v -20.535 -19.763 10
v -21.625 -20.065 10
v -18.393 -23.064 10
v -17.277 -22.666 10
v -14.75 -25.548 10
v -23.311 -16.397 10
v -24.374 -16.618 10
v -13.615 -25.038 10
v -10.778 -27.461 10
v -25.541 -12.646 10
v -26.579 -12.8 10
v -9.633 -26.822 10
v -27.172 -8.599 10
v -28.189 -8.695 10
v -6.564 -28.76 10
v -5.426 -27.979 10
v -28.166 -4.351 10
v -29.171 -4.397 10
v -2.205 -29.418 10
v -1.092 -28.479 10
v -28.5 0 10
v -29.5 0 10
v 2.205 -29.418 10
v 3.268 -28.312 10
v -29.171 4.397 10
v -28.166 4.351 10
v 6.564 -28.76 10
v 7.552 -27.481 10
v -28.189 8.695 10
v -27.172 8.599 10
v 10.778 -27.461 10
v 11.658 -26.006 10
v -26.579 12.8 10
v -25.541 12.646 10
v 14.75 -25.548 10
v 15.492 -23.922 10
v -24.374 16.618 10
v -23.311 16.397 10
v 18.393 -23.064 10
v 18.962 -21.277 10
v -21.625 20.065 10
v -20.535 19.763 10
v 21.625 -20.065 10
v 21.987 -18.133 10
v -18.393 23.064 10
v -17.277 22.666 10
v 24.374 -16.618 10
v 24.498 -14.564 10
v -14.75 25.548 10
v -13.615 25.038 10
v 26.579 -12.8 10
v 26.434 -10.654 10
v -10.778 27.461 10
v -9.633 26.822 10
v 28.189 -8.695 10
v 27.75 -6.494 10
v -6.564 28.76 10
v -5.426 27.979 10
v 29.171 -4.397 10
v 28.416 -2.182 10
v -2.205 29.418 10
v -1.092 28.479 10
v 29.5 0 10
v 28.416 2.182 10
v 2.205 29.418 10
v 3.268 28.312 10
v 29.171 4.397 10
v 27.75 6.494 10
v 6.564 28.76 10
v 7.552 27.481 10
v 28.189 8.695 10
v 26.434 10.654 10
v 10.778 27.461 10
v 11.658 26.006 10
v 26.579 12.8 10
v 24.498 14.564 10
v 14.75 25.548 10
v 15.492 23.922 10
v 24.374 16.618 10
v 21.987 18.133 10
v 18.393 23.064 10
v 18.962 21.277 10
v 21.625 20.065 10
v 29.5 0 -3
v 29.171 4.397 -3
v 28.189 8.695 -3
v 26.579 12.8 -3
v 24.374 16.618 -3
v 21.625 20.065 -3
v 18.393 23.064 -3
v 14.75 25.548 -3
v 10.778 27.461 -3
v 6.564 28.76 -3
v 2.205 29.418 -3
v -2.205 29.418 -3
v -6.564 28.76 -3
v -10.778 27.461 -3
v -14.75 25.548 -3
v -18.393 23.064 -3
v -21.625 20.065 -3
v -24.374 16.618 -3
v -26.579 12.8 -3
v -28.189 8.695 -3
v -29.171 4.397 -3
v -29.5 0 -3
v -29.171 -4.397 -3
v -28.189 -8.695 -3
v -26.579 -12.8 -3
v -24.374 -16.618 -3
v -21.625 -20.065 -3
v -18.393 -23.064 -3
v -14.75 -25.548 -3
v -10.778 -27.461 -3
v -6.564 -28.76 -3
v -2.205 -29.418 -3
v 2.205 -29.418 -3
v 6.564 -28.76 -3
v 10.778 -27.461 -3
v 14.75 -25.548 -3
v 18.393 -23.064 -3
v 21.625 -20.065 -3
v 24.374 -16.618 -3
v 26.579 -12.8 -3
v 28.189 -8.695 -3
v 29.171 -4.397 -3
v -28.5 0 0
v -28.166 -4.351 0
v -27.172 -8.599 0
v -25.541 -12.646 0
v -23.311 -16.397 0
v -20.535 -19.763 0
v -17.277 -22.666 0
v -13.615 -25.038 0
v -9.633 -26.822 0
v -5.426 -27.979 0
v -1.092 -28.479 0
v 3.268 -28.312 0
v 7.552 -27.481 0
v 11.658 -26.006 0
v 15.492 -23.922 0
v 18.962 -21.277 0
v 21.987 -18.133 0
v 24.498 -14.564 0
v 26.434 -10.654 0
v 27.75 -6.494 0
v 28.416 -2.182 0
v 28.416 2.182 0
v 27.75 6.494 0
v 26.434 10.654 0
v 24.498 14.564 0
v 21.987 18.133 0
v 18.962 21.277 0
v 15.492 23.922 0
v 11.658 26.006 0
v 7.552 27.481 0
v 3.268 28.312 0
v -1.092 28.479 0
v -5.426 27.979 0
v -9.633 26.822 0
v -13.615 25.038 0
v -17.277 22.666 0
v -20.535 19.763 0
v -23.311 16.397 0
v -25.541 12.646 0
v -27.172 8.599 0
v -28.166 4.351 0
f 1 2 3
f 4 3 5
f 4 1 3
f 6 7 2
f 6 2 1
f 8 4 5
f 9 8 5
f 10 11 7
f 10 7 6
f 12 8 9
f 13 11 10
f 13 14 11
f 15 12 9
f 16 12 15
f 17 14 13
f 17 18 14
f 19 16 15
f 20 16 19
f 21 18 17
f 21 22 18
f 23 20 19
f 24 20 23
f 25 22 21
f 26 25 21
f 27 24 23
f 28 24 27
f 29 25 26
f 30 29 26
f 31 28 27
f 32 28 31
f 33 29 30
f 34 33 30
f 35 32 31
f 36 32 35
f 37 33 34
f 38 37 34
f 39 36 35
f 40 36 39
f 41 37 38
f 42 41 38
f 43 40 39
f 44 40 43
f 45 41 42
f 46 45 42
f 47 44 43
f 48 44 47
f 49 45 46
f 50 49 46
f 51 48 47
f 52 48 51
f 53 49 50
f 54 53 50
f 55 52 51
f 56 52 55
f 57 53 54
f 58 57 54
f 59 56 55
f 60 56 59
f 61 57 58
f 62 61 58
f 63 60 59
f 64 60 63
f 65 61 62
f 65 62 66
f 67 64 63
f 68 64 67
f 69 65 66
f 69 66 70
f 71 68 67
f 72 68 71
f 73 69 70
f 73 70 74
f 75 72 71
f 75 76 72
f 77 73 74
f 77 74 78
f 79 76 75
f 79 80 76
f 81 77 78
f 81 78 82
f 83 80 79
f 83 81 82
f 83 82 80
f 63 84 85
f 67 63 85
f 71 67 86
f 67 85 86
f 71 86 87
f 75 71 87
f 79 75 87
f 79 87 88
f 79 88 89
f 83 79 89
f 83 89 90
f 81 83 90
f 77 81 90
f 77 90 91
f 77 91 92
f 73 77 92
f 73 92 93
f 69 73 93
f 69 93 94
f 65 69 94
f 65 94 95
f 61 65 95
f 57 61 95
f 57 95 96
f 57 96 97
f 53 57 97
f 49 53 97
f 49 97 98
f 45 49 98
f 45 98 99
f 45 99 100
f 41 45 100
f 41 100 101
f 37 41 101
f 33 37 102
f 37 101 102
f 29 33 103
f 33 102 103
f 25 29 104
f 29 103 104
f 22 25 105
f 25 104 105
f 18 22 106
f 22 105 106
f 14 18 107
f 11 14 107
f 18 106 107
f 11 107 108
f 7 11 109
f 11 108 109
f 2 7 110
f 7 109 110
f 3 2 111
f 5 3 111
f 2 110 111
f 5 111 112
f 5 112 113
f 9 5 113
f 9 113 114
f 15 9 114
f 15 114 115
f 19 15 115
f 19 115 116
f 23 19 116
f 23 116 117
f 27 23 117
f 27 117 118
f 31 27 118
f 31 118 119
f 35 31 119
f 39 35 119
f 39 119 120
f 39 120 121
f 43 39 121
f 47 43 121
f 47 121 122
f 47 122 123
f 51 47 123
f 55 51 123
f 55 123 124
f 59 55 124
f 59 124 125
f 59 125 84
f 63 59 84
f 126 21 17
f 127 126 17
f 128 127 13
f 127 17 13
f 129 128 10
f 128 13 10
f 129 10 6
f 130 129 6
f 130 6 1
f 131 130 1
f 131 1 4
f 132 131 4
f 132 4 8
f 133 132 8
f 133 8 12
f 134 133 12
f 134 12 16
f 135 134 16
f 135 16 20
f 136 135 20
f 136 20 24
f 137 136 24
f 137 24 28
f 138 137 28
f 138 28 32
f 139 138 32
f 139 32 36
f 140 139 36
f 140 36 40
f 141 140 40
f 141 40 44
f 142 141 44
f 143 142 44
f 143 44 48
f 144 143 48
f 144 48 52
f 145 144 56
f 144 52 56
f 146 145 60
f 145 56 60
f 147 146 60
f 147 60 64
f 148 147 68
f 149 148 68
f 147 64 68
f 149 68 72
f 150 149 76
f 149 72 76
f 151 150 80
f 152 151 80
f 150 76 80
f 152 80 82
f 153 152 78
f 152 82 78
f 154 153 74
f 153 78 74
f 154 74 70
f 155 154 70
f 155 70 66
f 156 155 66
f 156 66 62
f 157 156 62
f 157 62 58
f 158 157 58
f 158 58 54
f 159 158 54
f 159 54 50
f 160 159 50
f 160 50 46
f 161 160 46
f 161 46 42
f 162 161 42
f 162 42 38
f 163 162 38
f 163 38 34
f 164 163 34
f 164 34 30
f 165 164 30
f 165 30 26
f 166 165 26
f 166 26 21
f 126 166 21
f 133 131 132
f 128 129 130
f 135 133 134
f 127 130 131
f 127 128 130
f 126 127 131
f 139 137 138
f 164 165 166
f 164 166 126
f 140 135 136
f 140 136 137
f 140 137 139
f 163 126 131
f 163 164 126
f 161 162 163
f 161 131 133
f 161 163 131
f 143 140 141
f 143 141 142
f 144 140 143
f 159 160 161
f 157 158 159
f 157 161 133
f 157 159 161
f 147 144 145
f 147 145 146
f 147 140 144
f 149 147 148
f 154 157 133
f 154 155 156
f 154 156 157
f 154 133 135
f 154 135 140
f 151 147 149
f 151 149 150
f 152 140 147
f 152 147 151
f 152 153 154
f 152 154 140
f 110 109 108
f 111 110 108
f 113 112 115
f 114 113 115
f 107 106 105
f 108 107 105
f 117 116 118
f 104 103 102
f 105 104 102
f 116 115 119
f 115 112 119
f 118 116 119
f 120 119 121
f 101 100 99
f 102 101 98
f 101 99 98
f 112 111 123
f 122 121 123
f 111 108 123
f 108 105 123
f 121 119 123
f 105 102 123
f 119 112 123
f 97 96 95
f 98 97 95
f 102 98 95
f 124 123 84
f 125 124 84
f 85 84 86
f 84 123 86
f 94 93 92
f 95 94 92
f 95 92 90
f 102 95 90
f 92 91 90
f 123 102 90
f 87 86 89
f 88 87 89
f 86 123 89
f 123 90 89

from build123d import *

# Parameters (mm, degrees)
F0_R     = 29.5
F2_DEPTH = 10
F3_D     = 57
F5_R     = 29.5
F6_DEPTH = 3


with BuildPart() as f2:
    # F0 (on Top) → F2 (new body)
    with BuildSketch(Plane.XY):
        Circle(F0_R)
    extrude(amount=F2_DEPTH)

    # F3 (through all)
    with Locations(Plane(origin=(0, 0, 0), x_dir=(1, 0, 0), z_dir=(0, 0, -1))):
        with Locations((0, 0)):
            Hole(F3_D / 2)

    # F5 (on offset) → F6 (join)
    with BuildSketch(Plane.XY.offset(-3)):
        Circle(F5_R)
    extrude(amount=F6_DEPTH)


solid = f2.part
